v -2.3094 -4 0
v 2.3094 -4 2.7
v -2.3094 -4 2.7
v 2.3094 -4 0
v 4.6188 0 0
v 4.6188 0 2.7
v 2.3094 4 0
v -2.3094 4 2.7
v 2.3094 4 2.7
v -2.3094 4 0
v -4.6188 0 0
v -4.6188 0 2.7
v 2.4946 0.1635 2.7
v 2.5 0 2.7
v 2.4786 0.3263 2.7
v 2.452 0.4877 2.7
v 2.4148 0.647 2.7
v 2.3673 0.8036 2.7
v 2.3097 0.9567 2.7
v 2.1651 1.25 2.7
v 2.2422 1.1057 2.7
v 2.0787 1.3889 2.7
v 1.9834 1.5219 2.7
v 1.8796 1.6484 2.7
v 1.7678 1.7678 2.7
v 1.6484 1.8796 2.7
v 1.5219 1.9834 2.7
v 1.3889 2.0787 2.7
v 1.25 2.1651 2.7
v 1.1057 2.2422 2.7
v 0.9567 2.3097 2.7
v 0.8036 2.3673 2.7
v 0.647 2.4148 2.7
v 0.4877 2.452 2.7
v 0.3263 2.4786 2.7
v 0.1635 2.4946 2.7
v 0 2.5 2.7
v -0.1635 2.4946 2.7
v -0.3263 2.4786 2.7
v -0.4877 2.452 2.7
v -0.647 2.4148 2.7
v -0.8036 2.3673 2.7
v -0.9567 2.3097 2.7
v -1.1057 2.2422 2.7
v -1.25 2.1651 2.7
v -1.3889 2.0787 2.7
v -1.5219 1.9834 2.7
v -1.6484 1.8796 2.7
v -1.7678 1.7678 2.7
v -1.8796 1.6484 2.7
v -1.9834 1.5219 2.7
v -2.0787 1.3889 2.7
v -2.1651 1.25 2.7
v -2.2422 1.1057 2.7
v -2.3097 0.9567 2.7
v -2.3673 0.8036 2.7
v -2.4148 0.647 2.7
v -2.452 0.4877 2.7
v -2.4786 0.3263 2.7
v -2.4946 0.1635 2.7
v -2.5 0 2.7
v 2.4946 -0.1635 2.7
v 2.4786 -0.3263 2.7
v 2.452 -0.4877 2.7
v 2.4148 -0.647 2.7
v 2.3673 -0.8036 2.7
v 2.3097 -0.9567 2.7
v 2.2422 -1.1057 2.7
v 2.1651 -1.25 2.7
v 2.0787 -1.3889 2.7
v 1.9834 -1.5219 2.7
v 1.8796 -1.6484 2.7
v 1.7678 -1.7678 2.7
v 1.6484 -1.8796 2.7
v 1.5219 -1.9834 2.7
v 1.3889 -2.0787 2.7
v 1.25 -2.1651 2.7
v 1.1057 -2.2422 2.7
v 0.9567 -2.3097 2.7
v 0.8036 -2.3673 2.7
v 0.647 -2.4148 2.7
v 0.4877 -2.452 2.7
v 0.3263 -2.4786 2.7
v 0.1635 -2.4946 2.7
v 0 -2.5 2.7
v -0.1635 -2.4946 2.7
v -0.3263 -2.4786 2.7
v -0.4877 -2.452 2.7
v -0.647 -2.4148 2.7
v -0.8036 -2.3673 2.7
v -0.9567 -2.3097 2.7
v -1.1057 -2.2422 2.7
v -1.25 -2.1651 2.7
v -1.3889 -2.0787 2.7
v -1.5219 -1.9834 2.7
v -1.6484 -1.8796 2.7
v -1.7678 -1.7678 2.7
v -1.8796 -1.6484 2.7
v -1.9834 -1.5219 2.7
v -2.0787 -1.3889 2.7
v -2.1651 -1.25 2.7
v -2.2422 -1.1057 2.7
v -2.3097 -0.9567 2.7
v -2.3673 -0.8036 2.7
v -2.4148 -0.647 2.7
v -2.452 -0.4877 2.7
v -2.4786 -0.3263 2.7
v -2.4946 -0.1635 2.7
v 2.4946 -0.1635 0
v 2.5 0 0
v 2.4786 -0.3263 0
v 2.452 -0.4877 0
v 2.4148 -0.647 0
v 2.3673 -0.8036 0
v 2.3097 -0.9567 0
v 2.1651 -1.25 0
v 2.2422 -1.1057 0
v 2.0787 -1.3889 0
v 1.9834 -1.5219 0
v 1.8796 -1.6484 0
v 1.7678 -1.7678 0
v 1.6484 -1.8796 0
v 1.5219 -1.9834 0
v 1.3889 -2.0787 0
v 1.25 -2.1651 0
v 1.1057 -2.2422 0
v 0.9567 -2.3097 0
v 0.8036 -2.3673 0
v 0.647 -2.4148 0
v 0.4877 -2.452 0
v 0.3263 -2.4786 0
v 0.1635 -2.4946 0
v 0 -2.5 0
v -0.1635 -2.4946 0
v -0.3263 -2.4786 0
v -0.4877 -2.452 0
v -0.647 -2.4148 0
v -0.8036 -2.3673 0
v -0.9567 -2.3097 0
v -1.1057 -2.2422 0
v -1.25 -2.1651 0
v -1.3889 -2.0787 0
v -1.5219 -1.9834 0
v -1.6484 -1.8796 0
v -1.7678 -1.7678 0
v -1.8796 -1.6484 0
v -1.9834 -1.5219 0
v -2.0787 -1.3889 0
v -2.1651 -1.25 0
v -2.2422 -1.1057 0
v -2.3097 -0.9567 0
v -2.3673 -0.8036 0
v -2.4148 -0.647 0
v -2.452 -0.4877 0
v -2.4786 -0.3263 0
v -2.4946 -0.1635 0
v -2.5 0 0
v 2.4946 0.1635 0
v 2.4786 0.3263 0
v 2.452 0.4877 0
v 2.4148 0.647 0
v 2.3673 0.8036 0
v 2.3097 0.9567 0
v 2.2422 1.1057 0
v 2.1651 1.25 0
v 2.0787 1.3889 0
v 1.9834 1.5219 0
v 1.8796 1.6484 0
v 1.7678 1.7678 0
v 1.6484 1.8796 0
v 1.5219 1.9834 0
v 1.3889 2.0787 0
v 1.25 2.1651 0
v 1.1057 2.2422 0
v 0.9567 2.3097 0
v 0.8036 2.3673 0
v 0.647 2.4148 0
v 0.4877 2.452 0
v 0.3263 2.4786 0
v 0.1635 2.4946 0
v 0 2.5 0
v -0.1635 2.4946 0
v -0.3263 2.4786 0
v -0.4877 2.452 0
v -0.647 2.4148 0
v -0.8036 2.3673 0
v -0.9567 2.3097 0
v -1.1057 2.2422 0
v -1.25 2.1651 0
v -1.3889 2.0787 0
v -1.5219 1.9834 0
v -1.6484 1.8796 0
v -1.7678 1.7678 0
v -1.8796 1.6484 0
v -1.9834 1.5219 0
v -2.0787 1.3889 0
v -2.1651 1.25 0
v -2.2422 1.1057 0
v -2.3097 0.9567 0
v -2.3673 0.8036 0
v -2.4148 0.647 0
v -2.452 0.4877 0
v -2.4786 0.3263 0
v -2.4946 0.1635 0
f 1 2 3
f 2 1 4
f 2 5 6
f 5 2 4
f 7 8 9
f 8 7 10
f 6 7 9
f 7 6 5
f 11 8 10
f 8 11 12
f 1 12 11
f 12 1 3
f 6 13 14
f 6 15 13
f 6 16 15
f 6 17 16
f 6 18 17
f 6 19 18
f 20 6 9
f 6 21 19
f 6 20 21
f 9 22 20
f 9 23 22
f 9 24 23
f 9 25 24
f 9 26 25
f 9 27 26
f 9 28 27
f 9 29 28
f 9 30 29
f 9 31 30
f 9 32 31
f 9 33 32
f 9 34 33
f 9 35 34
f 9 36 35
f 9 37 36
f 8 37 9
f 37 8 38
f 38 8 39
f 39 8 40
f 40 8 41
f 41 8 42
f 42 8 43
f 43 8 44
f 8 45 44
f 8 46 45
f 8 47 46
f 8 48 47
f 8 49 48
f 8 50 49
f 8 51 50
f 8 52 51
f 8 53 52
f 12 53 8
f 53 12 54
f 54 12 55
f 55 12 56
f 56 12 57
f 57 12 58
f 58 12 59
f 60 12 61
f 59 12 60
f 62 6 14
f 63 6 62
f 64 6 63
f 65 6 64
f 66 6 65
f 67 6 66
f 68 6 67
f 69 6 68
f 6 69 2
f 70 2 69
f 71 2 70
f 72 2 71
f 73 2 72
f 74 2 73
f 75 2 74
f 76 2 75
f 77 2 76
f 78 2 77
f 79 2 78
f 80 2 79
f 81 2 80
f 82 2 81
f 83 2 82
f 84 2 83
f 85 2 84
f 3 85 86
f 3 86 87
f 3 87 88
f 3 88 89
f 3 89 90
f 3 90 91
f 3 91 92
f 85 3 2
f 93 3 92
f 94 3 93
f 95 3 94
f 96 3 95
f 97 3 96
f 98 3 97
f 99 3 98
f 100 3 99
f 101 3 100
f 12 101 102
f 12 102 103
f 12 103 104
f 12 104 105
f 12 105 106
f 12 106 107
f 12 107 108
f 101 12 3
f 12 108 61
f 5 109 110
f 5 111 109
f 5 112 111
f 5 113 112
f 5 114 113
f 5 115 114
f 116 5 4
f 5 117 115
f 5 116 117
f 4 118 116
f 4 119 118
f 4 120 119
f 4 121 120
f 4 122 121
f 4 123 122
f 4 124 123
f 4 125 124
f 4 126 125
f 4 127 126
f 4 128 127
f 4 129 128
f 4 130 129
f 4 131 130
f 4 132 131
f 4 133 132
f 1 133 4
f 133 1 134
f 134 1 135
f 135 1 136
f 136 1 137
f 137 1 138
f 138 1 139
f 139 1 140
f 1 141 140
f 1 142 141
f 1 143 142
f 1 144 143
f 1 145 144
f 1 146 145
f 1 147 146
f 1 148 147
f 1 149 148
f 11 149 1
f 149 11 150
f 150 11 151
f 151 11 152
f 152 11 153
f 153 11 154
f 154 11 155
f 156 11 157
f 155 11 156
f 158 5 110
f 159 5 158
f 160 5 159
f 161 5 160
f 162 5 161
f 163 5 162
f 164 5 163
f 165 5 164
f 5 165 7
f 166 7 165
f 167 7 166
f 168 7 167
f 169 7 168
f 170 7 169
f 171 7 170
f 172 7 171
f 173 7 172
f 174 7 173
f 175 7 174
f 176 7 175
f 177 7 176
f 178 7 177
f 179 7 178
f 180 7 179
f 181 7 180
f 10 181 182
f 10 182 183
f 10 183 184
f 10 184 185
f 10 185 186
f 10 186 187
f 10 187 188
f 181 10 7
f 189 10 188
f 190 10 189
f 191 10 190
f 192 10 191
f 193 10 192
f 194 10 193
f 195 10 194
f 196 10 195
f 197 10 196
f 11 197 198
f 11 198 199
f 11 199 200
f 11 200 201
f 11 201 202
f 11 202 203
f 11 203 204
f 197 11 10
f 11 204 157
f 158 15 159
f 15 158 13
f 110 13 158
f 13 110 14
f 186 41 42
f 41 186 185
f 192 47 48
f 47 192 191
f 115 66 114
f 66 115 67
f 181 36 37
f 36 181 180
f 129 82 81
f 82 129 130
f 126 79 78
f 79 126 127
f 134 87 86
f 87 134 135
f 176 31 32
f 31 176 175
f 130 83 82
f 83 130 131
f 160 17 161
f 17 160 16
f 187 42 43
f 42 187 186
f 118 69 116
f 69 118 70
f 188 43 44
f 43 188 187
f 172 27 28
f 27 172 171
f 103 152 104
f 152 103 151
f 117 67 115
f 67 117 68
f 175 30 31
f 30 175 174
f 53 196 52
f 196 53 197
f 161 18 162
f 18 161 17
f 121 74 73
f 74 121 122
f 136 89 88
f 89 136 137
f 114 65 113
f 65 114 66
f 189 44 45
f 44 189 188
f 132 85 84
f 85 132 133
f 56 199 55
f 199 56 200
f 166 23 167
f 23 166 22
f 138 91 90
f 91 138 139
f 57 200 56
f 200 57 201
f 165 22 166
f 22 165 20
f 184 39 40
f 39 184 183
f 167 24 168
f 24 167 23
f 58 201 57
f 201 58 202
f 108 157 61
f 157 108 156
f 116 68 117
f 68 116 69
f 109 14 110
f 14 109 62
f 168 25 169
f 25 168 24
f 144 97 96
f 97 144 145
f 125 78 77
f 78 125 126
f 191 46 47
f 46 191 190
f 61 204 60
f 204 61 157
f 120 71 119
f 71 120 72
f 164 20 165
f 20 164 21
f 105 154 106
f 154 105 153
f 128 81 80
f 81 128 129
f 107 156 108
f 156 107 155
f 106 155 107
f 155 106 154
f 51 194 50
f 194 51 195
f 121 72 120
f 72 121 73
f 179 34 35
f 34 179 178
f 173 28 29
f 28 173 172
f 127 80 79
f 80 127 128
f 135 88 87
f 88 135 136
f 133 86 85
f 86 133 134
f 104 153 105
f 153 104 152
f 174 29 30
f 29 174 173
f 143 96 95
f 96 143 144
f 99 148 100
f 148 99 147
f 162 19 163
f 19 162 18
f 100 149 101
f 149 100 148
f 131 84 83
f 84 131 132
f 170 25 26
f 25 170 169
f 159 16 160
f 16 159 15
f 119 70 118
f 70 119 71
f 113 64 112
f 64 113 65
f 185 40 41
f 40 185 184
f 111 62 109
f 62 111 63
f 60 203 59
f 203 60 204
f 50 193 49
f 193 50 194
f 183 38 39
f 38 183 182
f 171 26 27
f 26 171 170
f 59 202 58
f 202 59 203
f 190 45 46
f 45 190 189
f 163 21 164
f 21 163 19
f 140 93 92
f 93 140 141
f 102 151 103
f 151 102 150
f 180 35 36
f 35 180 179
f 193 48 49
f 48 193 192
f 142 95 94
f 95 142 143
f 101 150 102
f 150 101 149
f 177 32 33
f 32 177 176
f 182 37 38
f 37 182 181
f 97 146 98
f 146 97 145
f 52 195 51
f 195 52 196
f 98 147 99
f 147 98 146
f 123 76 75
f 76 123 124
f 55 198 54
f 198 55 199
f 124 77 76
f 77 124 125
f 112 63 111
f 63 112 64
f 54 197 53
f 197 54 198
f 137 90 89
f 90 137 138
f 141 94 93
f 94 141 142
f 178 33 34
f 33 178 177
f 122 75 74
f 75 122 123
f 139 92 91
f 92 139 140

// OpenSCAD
$fn = 96;

across_flats = 8.0;     // mm
thickness    = 2.7;     // mm
hole_d       = 5.0;     // mm (clearance as specified)

module hex_prism_af(af, h){
    // For a regular hexagon, circumradius R = af / sqrt(3)
    R = af / sqrt(3);
    cylinder(h=h, r=R, $fn=6);
}

difference() {
    hex_prism_af(across_flats, thickness);
    translate([0,0,-0.2]) cylinder(h=thickness+0.4, d=hole_d, $fn=96);
}
